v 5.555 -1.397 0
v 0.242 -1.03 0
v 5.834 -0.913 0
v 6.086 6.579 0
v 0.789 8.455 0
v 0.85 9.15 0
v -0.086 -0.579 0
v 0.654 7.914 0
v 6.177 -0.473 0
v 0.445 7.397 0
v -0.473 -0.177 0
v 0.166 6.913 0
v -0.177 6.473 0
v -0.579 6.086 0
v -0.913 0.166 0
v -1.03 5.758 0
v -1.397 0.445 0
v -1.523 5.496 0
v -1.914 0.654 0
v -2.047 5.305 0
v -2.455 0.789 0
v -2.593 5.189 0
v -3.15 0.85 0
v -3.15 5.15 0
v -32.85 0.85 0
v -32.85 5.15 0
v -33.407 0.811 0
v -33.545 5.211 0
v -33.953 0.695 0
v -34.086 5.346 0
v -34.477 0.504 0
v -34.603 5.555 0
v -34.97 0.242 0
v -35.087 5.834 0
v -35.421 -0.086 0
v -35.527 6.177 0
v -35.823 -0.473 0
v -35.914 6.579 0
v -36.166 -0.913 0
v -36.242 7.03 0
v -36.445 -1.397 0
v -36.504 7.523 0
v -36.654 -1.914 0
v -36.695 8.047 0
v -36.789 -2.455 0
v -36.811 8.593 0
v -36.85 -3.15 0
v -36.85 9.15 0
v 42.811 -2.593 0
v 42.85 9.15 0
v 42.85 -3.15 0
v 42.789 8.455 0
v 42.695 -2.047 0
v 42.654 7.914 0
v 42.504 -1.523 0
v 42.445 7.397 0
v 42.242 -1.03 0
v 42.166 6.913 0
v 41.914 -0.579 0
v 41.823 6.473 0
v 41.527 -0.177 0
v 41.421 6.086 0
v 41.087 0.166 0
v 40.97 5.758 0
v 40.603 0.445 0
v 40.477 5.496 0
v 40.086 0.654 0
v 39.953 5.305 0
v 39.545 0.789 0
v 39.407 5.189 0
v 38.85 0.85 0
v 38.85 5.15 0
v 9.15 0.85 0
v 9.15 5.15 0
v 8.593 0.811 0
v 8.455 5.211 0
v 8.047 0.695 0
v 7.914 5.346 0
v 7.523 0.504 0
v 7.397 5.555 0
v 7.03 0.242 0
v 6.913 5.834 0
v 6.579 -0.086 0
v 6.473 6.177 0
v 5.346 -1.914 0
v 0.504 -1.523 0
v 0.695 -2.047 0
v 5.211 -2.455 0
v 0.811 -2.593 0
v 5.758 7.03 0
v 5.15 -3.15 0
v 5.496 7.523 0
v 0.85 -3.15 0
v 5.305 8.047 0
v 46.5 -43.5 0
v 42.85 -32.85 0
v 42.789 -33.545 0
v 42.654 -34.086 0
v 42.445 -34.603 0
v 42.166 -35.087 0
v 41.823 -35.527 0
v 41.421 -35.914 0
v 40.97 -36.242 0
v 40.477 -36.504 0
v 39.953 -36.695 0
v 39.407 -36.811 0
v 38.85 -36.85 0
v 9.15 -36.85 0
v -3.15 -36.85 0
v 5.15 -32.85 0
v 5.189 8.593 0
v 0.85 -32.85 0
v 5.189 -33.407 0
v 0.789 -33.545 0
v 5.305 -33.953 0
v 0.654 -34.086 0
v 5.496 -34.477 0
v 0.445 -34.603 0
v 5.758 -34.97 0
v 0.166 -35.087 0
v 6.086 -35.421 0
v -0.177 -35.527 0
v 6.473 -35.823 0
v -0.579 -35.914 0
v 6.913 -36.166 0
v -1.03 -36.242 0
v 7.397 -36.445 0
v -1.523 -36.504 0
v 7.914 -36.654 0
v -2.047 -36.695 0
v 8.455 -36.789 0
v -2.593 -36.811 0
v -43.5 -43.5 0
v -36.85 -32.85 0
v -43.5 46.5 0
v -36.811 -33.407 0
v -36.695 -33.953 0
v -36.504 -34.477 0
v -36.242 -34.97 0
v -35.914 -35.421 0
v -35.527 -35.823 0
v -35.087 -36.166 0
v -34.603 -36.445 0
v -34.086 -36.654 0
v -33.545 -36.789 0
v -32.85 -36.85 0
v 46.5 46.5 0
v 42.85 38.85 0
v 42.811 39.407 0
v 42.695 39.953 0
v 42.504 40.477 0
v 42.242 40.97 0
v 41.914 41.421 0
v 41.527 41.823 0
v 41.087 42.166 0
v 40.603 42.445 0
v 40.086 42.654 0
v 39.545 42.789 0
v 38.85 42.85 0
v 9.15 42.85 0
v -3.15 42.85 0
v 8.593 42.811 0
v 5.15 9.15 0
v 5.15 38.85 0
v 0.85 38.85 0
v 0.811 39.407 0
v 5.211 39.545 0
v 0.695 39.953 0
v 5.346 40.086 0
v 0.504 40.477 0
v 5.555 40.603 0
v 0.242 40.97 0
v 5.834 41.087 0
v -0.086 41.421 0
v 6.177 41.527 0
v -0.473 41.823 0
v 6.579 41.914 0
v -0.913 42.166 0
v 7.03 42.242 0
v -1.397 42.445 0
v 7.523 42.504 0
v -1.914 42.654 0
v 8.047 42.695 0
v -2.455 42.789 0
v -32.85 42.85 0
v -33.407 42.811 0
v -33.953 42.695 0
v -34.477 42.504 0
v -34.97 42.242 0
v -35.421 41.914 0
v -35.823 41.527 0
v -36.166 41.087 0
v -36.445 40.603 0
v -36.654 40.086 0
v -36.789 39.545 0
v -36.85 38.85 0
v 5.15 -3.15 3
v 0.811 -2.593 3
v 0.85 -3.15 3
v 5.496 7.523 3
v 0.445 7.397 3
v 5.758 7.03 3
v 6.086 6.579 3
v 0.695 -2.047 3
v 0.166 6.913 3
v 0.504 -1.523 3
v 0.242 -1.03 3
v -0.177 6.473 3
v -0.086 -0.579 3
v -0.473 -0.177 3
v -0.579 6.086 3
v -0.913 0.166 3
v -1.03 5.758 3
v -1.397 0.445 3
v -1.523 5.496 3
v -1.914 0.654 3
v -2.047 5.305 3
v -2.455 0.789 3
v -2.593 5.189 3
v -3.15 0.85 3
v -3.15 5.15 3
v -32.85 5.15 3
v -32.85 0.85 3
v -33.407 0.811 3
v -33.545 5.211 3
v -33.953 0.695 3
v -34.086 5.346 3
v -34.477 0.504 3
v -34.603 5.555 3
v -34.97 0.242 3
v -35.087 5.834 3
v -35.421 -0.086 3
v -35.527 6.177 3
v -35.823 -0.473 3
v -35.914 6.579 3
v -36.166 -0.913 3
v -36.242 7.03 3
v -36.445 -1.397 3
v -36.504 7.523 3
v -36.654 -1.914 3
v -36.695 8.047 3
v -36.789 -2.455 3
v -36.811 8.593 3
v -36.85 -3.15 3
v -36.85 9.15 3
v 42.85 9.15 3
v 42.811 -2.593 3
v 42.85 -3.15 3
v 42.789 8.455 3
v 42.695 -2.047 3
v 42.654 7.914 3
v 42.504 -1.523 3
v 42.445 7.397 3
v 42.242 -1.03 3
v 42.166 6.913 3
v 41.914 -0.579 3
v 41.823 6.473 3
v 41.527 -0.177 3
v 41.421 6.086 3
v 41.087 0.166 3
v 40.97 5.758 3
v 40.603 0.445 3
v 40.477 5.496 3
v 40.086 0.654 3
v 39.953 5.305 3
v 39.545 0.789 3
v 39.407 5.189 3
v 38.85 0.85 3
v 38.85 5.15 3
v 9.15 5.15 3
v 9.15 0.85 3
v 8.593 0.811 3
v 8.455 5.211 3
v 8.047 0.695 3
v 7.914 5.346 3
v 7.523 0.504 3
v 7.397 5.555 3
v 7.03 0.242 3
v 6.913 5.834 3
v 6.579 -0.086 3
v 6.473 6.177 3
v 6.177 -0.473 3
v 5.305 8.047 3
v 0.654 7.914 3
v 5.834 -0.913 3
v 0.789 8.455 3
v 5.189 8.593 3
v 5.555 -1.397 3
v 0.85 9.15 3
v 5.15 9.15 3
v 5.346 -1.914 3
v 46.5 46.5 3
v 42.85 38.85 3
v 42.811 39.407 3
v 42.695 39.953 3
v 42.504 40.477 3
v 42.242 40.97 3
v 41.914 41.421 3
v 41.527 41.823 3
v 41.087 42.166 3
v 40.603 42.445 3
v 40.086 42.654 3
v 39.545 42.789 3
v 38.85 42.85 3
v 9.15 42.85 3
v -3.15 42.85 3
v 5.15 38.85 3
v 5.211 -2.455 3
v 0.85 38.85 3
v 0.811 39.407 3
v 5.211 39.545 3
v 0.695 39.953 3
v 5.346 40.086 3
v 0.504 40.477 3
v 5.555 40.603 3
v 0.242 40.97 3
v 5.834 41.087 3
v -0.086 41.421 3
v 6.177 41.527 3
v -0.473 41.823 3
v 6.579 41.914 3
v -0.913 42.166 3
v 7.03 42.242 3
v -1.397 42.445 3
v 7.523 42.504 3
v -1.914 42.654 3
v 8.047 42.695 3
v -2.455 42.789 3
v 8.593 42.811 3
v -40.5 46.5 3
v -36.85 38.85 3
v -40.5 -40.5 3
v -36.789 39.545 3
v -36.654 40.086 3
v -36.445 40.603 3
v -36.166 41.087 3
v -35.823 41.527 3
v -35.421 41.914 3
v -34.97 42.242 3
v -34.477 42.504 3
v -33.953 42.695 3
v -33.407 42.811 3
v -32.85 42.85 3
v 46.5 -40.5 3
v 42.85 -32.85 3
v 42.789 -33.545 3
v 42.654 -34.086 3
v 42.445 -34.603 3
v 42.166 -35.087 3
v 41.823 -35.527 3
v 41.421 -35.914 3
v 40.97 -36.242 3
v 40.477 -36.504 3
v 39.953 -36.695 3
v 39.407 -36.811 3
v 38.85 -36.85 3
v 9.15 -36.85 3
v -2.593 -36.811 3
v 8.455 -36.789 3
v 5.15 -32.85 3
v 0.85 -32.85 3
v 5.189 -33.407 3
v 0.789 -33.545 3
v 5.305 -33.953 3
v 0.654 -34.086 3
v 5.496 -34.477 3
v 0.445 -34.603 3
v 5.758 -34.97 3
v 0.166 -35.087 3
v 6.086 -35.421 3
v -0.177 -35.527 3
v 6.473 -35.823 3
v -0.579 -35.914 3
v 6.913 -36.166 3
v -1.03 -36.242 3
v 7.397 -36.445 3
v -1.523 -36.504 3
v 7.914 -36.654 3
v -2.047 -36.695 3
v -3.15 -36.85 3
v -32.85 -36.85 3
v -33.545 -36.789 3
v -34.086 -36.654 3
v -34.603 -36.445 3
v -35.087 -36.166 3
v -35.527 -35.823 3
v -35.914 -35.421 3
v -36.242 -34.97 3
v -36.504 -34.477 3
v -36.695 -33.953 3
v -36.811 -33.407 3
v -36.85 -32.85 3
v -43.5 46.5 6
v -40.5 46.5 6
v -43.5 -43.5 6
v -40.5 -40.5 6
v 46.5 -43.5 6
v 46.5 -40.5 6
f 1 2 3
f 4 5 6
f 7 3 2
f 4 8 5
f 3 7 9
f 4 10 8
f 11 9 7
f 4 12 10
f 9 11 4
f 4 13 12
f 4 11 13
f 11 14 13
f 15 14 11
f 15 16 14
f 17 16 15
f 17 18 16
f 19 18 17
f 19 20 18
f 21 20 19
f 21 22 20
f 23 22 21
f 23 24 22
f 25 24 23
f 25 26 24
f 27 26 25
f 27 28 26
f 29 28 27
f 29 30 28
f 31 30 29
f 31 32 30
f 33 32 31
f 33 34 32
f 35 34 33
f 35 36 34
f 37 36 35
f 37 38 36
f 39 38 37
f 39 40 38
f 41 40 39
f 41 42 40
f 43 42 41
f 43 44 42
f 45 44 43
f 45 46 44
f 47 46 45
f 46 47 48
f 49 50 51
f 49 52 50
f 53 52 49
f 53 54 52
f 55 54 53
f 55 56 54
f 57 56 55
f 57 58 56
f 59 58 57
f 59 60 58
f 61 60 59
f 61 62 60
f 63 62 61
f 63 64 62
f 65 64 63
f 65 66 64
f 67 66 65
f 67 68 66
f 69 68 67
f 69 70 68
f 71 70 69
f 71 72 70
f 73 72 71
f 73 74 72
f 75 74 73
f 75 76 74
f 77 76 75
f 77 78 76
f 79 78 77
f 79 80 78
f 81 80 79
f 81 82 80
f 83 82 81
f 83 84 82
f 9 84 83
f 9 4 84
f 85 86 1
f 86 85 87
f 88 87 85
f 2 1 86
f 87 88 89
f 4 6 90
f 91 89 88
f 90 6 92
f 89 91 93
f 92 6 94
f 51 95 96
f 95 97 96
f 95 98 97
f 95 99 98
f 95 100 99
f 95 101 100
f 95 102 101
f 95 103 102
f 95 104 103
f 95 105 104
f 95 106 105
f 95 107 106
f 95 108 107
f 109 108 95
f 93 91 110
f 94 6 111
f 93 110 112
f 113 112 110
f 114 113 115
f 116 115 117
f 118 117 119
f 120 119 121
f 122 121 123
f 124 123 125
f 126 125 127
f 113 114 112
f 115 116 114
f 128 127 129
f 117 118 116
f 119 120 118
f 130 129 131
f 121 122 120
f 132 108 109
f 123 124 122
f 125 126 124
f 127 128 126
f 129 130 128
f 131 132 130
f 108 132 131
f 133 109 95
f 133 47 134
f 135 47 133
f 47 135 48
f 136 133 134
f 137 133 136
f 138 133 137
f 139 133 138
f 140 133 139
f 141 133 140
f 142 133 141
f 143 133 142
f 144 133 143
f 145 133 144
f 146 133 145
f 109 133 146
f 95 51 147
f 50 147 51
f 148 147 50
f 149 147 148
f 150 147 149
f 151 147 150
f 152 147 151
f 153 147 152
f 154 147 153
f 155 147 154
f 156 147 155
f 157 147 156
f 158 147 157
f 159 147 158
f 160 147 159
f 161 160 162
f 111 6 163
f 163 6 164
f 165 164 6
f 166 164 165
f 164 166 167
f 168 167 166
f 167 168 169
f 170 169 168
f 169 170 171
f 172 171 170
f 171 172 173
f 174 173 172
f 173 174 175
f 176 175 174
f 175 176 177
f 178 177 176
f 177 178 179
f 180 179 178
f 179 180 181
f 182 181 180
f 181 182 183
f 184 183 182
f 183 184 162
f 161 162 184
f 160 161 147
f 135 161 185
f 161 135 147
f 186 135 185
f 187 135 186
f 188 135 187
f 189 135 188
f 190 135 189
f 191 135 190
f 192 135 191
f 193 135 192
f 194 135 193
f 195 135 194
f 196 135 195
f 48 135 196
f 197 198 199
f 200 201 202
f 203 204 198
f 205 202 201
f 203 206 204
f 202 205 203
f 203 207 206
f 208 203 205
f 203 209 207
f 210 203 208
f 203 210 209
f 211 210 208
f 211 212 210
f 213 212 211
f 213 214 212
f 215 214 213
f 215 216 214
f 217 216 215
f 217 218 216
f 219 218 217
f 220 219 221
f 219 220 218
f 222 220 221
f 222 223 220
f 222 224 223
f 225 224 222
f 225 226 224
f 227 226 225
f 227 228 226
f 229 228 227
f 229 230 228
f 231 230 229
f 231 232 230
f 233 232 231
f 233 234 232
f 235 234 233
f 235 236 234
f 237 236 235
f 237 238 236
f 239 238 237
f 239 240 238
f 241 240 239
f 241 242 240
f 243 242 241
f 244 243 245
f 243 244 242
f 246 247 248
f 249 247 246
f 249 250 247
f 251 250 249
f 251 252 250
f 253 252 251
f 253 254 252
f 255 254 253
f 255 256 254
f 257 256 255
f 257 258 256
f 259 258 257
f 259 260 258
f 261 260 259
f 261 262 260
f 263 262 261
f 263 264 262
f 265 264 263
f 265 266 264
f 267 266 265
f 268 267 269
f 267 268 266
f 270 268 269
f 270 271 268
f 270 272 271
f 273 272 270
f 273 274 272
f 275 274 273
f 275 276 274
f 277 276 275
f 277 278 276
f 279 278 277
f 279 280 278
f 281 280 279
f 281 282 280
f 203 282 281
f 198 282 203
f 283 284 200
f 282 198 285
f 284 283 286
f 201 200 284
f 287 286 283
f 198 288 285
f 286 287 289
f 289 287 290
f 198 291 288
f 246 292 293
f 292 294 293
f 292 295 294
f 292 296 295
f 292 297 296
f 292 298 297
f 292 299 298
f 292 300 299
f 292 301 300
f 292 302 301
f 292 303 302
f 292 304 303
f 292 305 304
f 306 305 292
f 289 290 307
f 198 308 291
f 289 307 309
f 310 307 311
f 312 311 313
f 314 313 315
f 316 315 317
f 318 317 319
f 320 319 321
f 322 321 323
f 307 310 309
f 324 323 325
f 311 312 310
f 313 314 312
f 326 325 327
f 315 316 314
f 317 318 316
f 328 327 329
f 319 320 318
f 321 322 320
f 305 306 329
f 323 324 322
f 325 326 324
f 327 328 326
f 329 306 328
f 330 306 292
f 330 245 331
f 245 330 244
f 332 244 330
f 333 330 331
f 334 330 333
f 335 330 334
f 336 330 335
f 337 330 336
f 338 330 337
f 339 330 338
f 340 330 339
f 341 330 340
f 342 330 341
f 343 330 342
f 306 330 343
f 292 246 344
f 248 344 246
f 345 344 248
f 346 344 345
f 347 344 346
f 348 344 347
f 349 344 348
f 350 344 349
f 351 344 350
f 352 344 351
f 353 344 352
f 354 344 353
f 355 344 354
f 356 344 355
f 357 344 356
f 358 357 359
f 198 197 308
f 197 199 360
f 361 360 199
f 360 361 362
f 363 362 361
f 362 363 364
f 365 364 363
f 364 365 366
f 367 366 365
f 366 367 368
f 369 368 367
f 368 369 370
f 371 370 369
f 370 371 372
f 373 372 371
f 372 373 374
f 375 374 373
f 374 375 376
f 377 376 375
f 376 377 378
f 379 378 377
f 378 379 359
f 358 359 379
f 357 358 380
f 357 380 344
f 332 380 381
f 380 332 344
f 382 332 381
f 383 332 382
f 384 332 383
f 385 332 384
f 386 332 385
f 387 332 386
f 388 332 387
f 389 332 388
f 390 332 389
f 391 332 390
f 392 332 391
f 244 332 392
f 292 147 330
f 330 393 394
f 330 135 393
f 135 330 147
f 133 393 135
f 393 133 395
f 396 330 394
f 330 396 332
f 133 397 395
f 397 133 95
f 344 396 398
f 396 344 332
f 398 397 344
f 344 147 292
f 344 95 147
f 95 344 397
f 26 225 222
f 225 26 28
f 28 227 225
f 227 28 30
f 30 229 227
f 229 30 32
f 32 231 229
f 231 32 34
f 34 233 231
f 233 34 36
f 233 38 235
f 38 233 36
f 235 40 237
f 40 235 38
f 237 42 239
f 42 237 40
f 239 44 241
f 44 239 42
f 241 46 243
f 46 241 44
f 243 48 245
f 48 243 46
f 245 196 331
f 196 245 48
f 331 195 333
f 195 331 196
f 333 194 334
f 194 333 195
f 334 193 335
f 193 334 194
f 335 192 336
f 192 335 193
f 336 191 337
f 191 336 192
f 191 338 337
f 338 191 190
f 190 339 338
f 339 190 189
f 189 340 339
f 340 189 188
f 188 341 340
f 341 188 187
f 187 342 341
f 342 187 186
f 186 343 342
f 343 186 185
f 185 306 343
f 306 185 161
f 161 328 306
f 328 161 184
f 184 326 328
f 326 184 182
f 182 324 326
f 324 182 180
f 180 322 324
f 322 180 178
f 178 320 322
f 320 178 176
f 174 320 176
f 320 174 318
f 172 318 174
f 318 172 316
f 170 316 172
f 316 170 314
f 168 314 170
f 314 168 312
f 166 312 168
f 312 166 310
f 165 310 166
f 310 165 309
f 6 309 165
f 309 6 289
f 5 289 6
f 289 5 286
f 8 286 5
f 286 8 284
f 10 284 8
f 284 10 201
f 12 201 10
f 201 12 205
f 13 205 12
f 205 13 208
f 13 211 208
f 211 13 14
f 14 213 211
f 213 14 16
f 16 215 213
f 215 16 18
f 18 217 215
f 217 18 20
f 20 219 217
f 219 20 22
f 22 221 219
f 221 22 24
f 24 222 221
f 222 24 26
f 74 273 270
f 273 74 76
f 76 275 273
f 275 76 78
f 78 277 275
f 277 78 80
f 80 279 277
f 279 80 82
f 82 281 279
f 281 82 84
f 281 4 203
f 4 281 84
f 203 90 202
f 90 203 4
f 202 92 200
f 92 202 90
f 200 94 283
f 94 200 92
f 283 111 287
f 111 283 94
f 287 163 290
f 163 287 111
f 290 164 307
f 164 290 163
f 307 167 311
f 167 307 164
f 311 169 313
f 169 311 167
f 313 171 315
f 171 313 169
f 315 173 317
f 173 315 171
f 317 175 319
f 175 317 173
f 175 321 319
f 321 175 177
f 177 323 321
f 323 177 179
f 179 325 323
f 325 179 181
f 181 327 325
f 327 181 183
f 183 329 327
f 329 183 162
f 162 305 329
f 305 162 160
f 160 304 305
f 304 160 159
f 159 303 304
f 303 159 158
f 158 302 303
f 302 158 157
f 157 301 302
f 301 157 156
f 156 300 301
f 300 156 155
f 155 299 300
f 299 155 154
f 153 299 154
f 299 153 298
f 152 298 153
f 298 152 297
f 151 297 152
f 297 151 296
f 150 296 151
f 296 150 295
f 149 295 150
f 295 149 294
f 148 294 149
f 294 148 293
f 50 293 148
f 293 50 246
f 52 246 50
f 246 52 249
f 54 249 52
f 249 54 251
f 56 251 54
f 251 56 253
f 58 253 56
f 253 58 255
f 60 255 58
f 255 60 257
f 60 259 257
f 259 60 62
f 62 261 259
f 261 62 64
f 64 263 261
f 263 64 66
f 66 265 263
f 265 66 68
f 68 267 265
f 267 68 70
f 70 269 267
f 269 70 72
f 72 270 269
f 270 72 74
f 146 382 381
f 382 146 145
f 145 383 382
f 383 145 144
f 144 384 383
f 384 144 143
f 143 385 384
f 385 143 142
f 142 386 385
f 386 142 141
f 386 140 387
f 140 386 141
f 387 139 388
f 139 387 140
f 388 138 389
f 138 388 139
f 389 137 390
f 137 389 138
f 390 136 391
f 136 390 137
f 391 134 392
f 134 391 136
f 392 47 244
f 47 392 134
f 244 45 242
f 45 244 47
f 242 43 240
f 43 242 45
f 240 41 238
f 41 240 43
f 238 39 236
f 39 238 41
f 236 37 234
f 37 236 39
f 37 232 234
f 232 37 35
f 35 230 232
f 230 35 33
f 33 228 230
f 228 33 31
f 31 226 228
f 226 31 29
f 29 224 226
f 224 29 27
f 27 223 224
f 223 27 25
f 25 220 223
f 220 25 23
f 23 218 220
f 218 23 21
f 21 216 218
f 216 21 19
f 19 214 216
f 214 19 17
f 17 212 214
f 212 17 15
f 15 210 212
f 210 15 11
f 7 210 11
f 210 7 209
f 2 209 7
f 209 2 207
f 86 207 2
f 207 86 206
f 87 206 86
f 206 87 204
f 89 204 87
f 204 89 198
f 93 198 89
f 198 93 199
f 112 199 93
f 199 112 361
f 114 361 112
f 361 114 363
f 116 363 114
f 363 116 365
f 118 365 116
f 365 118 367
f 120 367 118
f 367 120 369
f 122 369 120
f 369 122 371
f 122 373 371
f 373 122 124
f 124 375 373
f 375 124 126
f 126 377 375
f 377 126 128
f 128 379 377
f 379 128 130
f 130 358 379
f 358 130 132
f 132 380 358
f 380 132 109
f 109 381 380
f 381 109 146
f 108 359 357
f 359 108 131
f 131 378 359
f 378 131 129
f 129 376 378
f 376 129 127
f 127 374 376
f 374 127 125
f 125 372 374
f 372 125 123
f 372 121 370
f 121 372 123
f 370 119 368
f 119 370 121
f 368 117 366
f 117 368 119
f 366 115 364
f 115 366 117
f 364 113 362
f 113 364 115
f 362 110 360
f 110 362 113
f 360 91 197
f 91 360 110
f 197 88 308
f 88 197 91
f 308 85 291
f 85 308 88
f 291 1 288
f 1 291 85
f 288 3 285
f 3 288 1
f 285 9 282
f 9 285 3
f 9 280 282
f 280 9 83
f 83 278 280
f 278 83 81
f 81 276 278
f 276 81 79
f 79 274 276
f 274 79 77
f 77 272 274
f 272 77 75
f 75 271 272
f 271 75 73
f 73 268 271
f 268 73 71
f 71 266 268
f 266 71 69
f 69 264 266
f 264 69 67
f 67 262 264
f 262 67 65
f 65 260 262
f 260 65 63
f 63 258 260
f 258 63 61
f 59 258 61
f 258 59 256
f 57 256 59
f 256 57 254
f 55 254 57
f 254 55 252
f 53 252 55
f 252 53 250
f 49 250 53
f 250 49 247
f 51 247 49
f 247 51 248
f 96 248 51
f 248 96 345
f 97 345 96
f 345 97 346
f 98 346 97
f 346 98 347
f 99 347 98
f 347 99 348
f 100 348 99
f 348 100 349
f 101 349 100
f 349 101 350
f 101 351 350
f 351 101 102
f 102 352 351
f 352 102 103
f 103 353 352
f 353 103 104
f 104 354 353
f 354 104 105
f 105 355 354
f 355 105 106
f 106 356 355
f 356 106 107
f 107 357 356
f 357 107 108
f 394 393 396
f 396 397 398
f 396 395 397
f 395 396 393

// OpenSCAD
// file: standard.scad
// Gridfinity parameters
g_unit_plan = 42;
g_unit_height = 7;

// Maximum thickness were we could use the interior wall of the base plate
g_thickness_theshold = 3.95;

g_off_before_thickness = 2*2.15;
g_off_after_thickness = 2*2.85;

g_radius = 4;

g_connector_piece_box_length=5;
g_connector_piece_feet_length=10;
// main file
include <utility.scad>
include <standard.scad>


/* [Setup Parameters] */
$fa = 8;
$fs = 0.25;


/* [General Settings] */

// Laser cutted or 3D printed Jig
is_laser_cutted = true;

// Prepare the plan for the laser cutted jig
output_plan = false;

// Laser cutted or 3D printed Jig
g_is_half_unit = false;

// Material thickness
thickness = 3;

// Number of holes in the grid
gridx=2;

// Length of a notch
length_notch = 10;



// ===== IMPLEMENTATION ===== //



// offset of the feet (related to the thickness)
g_offset = thickness < g_thickness_theshold ? g_off_before_thickness : g_off_after_thickness;
// Unit used
g_used_unit = g_is_half_unit ? g_unit_plan /2 : g_unit_plan;
used_hole_unit = g_is_half_unit ? g_unit_plan/2 - g_offset : g_unit_plan - g_offset;

// For notch function
remove_small_notch=true;

g_nx = g_is_half_unit ? 2 * gridx : gridx;

l = gridx*g_unit_plan + 2*thickness;

if(is_laser_cutted){
  if(output_plan){
    plan_corner_jig_laser();
  } else {
    corner_jig_laser();
  }
} else {
  corner_jig_3d();
}

module bottom_jig(){
  // Number of elements
  gridx=2;
  g_nx = g_is_half_unit ? 2 * gridx : gridx;

  difference(){
    rounded_square(gridx*g_unit_plan+thickness, g_radius);

    grid(g_nx, g_nx, g_used_unit)
    rounded_square(used_hole_unit, g_radius);
  }
}

module corner_jig_3d(){
  // Number of elements
  color("tomato")
  union(){
    linear_extrude(height=thickness)
    difference(){
      translate([thickness/2, thickness/2])
      square(l, center=true);

      translate([thickness, thickness, 0])
      grid(g_nx, g_nx, g_used_unit)
      rounded_square(used_hole_unit, g_radius);
    }
    linear_extrude(height=thickness*2)
    translate([thickness/2,-gridx * g_unit_plan/2, 0])
    square([l,thickness], center=true);

    linear_extrude(height=thickness*2)
    translate([-gridx * g_unit_plan/2, thickness/2,0])
    square([thickness, l], center=true);
  }
}

module bottom_corner_jig_laser(){
  difference(){
    translate([thickness/2, thickness/2])
    square(l, center=true);

    translate([thickness, thickness, 0])
    grid(g_nx, g_nx, g_used_unit)
    rounded_square(used_hole_unit, g_radius);

    translate([thickness/2,-gridx * g_unit_plan/2, 0])
    mirror([0,1,0])
    notch(l, length_notch);

    translate([-gridx * g_unit_plan/2,thickness/2, 0])
    rotate([0,0,90])
    /*mirror([0,1,0])*/
    notch(l, length_notch);
  }
}

module side_a_corner_jig_laser(){
  difference(){
    square([l, 2*thickness],center=true);
    translate([0,thickness/2,0])
    notch(l, length_notch, reverse=false);
  }
}

module side_b_corner_jig_laser(){
  difference(){
    side_a_corner_jig_laser();

    translate([-l/2+thickness/2-0.1,0,0])
    square([thickness+0.1,2*thickness+0.1],center=true);
  }
}

module corner_jig_laser(){
  // Number of elements

  color("tomato")
  linear_extrude(height=thickness)
  bottom_corner_jig_laser();

  color("blue")
  translate([thickness/2,-gridx * g_unit_plan/2,thickness])
  rotate([-90,0,0])
  linear_extrude(height=thickness, center=true)
  side_a_corner_jig_laser();


  color("green")
  translate([-gridx * g_unit_plan/2,thickness/2,thickness])
  rotate([-90,0,90])
  linear_extrude(height=thickness, center=true)
  side_b_corner_jig_laser();

}


module plan_corner_jig_laser(){
  // Number of elements

  color("tomato")
  bottom_corner_jig_laser();

  color("blue")
  translate([thickness/2,-gridx * g_unit_plan/2 - 1.5*thickness - 1,thickness/2])
  rotate([0,0,0])
  side_a_corner_jig_laser();


  color("green")
  translate([-gridx * g_unit_plan/2 - 1.5*thickness - 1,thickness/2,thickness/2])
  rotate([0,0,90])
  side_b_corner_jig_laser();

}
